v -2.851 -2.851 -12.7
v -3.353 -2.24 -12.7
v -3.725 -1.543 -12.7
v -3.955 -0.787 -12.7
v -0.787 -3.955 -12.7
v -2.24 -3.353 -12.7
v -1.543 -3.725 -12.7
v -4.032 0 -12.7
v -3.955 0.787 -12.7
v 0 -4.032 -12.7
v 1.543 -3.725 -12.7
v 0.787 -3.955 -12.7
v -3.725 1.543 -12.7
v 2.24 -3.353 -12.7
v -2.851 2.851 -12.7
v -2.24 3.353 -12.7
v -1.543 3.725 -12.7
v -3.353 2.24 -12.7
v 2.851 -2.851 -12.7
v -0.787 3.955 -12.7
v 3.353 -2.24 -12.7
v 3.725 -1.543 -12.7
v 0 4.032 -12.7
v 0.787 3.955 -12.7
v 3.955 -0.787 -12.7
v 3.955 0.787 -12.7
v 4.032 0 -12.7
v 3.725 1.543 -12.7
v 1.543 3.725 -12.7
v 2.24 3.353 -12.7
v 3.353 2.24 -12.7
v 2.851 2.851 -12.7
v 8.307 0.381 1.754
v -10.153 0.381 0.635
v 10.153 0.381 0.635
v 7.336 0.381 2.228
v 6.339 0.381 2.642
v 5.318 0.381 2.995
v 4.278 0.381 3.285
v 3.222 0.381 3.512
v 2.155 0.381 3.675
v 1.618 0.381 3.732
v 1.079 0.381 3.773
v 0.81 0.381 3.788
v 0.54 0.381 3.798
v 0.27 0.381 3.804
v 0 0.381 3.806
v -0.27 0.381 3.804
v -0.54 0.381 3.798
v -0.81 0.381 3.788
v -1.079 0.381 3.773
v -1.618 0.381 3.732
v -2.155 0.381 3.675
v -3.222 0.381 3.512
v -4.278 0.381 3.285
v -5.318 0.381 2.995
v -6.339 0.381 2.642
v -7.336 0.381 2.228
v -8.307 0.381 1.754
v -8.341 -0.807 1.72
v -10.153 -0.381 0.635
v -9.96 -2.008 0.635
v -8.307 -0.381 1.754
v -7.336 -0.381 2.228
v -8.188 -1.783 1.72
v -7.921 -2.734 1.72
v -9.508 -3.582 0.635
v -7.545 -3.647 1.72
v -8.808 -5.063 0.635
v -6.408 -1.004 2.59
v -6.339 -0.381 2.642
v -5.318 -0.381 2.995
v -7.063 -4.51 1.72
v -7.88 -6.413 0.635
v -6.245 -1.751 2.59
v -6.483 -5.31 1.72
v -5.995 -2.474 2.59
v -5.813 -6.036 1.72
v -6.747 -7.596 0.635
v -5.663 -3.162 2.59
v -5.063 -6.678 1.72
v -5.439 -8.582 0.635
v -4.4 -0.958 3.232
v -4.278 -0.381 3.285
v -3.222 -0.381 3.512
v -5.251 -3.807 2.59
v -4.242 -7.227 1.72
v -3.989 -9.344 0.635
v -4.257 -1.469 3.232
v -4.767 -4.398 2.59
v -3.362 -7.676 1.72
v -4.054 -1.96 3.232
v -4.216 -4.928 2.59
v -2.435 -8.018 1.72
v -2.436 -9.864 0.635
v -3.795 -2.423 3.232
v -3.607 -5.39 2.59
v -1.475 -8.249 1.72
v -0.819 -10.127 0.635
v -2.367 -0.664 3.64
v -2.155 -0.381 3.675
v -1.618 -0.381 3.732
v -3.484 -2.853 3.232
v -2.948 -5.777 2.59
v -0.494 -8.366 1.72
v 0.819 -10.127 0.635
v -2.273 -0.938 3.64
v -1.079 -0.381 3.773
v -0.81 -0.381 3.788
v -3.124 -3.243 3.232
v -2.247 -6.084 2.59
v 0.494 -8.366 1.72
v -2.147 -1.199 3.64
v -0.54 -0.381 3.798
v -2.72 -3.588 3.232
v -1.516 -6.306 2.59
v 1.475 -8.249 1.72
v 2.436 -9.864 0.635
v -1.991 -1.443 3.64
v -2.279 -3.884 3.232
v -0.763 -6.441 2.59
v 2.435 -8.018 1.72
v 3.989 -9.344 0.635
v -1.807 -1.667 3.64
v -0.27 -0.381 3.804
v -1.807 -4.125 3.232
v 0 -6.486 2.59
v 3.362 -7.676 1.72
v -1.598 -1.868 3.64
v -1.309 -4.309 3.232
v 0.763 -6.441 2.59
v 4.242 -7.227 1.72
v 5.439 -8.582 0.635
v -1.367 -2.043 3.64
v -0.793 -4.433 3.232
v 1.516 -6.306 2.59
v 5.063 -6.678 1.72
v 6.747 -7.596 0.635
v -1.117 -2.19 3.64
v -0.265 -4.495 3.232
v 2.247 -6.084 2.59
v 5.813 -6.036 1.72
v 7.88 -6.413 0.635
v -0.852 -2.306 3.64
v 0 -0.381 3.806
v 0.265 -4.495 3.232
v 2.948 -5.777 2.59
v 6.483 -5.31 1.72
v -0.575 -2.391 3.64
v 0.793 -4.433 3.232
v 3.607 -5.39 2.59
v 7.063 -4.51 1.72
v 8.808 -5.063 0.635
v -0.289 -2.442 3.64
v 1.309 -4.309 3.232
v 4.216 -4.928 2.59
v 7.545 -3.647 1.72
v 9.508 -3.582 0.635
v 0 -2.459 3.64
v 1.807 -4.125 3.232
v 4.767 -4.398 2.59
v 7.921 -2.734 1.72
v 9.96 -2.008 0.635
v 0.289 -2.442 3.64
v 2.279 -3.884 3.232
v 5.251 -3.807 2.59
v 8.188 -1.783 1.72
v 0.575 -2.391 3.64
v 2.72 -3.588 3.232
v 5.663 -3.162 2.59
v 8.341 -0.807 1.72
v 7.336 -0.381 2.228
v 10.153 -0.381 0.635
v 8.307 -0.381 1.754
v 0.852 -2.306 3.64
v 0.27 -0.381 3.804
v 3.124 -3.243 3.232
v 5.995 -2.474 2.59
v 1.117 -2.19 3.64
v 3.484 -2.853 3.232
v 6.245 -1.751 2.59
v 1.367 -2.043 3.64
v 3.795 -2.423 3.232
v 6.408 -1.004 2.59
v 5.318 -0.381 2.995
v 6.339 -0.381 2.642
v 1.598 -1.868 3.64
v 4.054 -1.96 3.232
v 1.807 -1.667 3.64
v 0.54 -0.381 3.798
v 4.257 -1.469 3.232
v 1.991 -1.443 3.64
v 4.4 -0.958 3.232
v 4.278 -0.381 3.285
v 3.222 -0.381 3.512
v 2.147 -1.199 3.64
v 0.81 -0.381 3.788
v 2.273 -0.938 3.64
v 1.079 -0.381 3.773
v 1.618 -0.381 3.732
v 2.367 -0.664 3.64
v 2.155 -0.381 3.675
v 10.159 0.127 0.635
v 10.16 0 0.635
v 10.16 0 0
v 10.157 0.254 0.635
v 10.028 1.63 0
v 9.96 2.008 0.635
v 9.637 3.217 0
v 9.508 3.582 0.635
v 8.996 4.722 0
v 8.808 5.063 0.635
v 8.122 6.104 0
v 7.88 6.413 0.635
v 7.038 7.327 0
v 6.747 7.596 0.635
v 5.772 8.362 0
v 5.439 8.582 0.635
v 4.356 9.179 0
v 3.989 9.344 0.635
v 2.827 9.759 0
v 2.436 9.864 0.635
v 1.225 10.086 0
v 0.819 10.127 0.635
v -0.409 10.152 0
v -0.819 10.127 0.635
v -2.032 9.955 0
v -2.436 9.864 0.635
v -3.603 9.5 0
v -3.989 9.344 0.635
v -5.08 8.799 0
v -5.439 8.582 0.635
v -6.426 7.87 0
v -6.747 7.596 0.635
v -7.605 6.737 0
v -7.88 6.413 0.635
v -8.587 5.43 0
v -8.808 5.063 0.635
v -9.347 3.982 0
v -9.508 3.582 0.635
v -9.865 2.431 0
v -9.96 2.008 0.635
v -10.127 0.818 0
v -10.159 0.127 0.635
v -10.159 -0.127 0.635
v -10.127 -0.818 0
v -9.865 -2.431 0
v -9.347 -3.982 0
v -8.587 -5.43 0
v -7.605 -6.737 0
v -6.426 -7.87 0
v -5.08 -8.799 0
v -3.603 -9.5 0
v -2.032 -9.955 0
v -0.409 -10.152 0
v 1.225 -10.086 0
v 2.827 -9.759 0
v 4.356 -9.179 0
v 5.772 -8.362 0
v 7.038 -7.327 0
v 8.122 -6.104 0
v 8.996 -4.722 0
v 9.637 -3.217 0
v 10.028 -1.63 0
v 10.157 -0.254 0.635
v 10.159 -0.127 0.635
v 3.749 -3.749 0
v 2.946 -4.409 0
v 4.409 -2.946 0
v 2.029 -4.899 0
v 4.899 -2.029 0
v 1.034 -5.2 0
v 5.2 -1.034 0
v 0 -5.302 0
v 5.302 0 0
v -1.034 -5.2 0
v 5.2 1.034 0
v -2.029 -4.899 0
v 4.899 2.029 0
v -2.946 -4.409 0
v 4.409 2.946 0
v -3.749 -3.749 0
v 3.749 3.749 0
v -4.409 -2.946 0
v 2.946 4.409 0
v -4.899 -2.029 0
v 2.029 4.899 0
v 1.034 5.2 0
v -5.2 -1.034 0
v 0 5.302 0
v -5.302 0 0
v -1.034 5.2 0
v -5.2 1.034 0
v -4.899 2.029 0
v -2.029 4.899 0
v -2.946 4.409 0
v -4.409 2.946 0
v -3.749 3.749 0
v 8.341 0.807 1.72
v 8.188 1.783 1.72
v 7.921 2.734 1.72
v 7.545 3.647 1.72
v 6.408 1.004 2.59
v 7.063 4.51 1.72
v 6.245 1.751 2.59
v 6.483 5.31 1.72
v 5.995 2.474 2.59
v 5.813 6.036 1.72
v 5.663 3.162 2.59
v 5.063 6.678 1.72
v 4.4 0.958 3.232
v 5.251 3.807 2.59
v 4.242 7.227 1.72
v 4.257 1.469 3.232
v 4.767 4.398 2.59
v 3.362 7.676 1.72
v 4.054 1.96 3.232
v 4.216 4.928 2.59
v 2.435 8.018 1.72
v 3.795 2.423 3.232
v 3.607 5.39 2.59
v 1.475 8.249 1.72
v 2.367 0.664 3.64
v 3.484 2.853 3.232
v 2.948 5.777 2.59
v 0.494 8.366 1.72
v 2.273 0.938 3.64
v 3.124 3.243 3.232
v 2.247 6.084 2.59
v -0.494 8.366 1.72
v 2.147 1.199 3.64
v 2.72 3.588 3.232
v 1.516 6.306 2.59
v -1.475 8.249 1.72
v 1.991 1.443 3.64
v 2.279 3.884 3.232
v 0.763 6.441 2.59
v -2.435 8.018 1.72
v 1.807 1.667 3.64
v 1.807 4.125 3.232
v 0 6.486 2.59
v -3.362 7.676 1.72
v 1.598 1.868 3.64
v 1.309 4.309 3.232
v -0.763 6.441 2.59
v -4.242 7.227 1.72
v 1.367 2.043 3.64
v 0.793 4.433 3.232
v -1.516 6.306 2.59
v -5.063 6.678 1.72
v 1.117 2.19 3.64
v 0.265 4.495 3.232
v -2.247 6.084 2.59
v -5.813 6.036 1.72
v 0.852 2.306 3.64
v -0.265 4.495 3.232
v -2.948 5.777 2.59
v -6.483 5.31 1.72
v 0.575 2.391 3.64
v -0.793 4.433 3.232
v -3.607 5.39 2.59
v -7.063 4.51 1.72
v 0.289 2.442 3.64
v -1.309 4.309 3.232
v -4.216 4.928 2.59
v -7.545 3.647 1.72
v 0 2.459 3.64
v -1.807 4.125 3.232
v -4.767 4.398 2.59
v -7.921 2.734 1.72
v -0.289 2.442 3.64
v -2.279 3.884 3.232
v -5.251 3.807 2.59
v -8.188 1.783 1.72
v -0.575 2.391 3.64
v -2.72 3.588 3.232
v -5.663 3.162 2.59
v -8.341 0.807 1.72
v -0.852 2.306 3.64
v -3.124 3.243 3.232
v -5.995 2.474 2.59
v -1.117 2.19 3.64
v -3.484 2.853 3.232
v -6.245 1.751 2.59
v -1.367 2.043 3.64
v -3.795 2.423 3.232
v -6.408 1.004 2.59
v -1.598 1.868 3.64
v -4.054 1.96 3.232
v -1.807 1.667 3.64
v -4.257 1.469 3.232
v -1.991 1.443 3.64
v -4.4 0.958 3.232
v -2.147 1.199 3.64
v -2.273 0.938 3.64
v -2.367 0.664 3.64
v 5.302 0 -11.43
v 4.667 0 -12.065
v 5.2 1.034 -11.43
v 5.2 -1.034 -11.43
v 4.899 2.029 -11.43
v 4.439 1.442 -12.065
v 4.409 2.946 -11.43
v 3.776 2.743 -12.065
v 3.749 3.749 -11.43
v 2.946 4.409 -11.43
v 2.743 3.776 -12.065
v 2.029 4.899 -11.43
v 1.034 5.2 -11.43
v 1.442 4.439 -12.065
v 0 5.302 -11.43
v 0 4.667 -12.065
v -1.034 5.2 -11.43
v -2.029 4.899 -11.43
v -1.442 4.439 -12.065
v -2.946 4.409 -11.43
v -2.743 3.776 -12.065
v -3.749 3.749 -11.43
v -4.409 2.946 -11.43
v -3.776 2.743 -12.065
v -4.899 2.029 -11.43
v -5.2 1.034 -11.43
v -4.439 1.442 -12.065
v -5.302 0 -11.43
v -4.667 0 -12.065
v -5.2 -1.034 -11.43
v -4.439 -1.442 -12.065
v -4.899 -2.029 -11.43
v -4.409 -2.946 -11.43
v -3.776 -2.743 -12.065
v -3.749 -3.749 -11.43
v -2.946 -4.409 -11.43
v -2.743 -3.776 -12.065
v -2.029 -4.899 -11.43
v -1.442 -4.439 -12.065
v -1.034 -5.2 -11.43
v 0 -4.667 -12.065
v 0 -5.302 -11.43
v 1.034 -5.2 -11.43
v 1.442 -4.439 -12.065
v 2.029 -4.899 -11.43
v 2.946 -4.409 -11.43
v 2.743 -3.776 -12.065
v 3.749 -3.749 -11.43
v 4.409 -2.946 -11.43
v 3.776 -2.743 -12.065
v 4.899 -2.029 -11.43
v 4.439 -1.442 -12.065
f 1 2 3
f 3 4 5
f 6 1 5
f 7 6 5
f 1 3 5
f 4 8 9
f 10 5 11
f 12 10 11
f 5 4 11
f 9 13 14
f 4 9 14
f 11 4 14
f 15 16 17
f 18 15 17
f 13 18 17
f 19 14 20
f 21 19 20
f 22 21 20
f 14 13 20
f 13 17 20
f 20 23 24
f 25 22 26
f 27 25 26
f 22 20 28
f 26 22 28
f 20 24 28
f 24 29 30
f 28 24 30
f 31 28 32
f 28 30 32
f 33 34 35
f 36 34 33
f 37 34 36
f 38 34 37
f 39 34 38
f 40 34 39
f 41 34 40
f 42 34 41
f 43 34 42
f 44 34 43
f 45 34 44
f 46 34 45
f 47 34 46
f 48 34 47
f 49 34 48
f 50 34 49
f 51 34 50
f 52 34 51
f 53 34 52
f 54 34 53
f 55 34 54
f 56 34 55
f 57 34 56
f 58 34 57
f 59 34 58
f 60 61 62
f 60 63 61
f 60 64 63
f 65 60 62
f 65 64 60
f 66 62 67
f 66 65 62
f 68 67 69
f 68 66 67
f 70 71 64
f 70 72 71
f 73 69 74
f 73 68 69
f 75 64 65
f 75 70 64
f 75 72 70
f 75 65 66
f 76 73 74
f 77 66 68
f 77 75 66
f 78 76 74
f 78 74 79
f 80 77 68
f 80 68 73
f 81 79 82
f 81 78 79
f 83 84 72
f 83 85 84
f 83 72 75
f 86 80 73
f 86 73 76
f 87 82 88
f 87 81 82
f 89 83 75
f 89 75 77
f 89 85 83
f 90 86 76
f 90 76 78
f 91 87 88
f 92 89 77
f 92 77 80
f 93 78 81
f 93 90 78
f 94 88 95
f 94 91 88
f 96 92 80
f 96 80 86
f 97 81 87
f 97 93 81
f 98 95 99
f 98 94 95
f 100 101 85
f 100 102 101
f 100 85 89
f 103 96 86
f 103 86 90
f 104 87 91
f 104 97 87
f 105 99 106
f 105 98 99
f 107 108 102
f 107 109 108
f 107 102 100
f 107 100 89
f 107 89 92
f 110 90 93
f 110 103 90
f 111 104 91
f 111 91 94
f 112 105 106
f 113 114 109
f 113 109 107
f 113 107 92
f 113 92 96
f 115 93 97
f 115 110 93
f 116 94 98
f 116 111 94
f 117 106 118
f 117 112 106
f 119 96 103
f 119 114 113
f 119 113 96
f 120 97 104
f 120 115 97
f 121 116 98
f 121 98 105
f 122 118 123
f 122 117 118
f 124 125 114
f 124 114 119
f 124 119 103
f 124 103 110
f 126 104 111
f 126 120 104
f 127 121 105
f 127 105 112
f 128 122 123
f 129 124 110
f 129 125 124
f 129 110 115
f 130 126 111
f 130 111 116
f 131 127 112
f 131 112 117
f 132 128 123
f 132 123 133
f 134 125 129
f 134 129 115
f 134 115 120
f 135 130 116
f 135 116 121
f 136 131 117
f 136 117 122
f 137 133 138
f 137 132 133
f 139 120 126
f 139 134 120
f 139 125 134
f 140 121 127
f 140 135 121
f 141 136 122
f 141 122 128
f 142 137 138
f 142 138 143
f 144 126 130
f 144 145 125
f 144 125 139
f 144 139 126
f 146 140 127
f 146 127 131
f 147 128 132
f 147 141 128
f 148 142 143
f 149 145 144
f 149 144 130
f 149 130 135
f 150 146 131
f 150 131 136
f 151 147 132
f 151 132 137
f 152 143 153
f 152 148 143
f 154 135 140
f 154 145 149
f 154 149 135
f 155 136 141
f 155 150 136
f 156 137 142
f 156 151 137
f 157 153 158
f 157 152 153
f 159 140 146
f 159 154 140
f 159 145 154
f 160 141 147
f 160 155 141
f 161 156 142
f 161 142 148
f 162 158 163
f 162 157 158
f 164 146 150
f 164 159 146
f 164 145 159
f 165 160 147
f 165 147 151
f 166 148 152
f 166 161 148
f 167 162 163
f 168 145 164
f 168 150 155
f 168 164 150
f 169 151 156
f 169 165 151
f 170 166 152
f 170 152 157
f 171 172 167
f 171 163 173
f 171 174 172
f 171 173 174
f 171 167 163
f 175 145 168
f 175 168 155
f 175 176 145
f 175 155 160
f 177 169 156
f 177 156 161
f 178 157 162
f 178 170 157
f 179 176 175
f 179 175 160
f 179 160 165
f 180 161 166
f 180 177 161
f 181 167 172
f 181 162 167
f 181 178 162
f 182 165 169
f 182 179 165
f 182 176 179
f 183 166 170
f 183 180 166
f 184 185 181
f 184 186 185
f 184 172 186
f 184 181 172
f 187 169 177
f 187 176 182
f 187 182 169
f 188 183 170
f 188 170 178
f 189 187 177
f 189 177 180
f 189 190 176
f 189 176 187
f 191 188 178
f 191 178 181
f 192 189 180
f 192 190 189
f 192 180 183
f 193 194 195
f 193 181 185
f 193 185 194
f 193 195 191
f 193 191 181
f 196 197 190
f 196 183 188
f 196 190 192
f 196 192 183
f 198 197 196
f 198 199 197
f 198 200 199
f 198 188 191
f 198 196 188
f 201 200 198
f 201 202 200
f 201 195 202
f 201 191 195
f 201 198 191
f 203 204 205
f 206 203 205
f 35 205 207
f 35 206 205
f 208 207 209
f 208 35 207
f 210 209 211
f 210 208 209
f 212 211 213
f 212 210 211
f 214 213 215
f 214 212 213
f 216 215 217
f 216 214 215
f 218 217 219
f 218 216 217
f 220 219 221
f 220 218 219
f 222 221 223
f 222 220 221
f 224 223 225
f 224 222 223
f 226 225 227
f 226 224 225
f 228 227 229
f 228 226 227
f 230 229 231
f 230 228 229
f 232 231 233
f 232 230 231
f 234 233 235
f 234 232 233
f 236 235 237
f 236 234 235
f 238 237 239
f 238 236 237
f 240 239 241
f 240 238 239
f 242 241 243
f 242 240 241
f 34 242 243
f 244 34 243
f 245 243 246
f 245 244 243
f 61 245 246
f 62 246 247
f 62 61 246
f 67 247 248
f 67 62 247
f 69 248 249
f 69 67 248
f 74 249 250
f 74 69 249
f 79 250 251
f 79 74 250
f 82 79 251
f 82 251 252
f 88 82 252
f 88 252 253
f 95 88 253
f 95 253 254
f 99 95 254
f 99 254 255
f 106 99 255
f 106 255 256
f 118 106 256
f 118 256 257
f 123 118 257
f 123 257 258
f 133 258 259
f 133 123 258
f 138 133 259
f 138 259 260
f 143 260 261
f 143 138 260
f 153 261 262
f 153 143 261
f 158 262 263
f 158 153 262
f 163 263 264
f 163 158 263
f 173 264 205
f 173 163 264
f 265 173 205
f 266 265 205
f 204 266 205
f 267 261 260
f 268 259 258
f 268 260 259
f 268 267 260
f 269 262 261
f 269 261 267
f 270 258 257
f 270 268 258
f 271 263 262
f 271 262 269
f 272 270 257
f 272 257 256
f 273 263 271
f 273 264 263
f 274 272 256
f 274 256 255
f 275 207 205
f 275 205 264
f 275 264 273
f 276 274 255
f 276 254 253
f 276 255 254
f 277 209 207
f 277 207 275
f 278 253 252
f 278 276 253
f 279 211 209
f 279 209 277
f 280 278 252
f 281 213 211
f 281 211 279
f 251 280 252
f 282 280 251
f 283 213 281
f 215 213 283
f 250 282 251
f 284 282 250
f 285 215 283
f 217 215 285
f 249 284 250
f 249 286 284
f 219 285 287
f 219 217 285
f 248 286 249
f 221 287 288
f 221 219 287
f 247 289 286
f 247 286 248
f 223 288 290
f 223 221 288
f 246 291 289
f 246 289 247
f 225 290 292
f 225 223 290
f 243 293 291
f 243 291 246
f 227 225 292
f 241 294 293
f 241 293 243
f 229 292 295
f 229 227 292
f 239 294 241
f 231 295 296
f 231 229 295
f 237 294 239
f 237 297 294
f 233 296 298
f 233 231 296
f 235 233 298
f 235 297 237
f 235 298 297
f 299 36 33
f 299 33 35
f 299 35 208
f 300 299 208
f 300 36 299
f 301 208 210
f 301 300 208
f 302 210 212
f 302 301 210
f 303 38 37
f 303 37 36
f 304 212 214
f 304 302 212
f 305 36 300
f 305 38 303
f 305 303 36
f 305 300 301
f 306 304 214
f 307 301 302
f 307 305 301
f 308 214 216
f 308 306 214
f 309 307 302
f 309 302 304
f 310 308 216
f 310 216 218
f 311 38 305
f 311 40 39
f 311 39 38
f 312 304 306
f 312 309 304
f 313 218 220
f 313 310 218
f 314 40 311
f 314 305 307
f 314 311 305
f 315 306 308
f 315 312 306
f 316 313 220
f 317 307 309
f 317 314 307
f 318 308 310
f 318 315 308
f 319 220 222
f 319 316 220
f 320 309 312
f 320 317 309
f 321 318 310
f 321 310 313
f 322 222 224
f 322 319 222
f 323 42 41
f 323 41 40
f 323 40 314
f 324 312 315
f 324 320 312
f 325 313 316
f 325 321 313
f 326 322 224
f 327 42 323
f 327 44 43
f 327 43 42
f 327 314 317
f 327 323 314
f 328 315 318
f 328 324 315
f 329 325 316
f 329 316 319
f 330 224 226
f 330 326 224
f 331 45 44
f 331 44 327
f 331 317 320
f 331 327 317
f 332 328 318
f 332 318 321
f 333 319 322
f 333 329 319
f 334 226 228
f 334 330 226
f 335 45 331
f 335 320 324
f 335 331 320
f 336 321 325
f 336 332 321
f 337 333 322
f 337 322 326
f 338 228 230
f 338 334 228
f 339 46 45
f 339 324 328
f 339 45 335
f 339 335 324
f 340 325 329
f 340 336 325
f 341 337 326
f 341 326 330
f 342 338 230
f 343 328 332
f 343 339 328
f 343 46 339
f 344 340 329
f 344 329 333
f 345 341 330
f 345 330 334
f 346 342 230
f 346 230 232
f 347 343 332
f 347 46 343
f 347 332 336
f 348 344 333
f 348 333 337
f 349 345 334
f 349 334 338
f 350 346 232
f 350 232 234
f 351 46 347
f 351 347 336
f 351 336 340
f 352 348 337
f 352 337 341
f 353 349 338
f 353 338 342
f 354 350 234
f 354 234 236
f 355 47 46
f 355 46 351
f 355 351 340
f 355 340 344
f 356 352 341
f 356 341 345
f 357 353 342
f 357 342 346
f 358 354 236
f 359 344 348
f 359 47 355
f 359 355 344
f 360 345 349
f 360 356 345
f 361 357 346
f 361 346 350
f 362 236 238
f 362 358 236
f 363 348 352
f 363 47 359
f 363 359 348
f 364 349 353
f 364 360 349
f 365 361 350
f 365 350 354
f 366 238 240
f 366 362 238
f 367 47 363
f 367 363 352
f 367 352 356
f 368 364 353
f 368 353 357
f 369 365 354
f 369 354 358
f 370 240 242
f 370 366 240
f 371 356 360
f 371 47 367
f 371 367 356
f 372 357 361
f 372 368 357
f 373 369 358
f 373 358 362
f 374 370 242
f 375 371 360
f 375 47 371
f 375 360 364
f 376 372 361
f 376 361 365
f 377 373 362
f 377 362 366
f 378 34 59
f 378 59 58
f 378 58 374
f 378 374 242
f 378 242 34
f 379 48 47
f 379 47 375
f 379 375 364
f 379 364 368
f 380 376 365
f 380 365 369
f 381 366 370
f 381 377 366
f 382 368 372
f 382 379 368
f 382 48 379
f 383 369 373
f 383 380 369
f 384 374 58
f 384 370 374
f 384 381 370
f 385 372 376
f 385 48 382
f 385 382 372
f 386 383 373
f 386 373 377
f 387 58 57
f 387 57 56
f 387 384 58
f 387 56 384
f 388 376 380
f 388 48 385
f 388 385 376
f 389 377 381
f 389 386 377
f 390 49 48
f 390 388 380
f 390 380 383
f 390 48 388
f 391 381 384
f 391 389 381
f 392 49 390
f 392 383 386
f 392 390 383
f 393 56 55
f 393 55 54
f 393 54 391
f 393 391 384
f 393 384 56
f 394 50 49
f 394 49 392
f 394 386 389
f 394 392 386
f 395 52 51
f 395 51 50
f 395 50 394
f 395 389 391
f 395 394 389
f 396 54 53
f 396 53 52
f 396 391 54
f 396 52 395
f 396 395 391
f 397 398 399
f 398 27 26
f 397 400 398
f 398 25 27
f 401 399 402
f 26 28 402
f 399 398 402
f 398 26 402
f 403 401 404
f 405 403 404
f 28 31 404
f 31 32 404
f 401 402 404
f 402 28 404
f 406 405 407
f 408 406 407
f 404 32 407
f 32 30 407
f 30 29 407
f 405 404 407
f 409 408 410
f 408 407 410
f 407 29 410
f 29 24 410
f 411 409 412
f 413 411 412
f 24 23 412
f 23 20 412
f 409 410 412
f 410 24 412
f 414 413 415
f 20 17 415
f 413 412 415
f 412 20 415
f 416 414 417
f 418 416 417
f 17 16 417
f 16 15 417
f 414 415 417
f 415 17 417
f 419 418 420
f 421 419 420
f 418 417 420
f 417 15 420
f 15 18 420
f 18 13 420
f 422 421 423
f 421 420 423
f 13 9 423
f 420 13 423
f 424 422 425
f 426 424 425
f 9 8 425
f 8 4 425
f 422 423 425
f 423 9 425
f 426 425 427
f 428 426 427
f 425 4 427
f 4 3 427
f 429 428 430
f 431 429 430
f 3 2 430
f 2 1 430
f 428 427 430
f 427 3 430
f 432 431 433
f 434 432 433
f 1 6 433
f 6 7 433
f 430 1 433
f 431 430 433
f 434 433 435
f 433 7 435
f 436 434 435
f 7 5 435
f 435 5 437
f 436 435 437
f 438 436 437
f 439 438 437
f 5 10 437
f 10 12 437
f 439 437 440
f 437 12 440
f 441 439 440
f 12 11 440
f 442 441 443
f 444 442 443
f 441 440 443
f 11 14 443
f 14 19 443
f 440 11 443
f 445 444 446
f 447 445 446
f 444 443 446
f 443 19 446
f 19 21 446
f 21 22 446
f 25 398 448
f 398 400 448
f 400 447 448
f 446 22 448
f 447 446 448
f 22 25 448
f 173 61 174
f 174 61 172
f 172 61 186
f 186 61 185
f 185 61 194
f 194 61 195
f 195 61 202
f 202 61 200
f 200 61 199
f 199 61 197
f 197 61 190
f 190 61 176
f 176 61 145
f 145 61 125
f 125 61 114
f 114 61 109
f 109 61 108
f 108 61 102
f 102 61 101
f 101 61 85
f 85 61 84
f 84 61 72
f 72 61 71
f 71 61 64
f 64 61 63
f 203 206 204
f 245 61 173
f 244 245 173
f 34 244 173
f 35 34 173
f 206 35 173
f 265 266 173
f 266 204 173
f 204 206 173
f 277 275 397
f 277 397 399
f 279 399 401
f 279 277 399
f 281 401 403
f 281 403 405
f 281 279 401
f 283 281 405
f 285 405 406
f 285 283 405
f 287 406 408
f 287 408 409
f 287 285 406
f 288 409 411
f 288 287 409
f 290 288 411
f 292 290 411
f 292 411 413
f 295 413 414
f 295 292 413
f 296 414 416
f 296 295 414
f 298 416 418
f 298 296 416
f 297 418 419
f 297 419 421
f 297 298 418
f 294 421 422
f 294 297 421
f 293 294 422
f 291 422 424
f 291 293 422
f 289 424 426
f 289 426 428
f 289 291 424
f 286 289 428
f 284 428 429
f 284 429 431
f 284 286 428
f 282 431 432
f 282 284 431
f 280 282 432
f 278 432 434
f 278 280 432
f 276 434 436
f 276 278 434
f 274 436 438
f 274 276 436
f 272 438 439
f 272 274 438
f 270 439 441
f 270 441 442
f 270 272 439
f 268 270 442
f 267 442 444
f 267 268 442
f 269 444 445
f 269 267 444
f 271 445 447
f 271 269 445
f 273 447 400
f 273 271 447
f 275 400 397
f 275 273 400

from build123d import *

# Parameters (mm, degrees)
SKETCH4_R               = 5.30225
BOSS_EXTRUDE3_DEPTH     = 12.7
CUT_EXTRUDE1_DEPTH      = 0.381
CUT_EXTRUDE1_DEPTH_BACK = 0.381
SKETCH6_W               = 20.32
SKETCH6_H               = 5.08
CHAMFER1_SIZE           = 1.27


with BuildPart() as part:
    # Sketch4 → Boss-Extrude3 (new body)
    with BuildSketch(Plane.XY):
        Circle(SKETCH4_R)
    extrude(amount=-BOSS_EXTRUDE3_DEPTH)

    # Sketch5 → Revolve2 (revolve)
    with BuildSketch(Plane(origin=(0, 0, 0), x_dir=(1, 0, 0), z_dir=(0, 1, 0)), mode=Mode.PRIVATE) as revolve2_sk:
        with BuildLine():
            Line((-10.16, 0), (-10.16, -0.635))
            ThreePointArc((-10.16, -0.635), (-5.32226984, -2.997763488), (0, -3.81))
            Line((0, -3.81), (0, 0))
            Line((0, 0), (-10.16, 0))
        make_face()
    revolve(revolve2_sk.sketch.rotate(Axis((0, 0, 0), (0, 0, 1)), 180), axis=Axis((0, 0, 0), (0, 0, 1)))

    # Sketch6 → Cut-Extrude1 (cut, two sides: drawn at the far end of the back side and taken through both)
    with BuildSketch(Plane(origin=(0, 0, 0), x_dir=(1, 0, 0), z_dir=(0, 1, 0)).offset(-CUT_EXTRUDE1_DEPTH_BACK)):
        with Locations((0, -3.175)):
            Rectangle(SKETCH6_W, SKETCH6_H)
    extrude(amount=CUT_EXTRUDE1_DEPTH + CUT_EXTRUDE1_DEPTH_BACK, mode=Mode.SUBTRACT)

    # Chamfer1
    chamfer1_edges = [part.edges().sort_by_distance(p)[0] for p in [
        (-5.30225, 0, -12.7),
    ]]
    chamfer(chamfer1_edges, length=CHAMFER1_SIZE)


solid = part.part
